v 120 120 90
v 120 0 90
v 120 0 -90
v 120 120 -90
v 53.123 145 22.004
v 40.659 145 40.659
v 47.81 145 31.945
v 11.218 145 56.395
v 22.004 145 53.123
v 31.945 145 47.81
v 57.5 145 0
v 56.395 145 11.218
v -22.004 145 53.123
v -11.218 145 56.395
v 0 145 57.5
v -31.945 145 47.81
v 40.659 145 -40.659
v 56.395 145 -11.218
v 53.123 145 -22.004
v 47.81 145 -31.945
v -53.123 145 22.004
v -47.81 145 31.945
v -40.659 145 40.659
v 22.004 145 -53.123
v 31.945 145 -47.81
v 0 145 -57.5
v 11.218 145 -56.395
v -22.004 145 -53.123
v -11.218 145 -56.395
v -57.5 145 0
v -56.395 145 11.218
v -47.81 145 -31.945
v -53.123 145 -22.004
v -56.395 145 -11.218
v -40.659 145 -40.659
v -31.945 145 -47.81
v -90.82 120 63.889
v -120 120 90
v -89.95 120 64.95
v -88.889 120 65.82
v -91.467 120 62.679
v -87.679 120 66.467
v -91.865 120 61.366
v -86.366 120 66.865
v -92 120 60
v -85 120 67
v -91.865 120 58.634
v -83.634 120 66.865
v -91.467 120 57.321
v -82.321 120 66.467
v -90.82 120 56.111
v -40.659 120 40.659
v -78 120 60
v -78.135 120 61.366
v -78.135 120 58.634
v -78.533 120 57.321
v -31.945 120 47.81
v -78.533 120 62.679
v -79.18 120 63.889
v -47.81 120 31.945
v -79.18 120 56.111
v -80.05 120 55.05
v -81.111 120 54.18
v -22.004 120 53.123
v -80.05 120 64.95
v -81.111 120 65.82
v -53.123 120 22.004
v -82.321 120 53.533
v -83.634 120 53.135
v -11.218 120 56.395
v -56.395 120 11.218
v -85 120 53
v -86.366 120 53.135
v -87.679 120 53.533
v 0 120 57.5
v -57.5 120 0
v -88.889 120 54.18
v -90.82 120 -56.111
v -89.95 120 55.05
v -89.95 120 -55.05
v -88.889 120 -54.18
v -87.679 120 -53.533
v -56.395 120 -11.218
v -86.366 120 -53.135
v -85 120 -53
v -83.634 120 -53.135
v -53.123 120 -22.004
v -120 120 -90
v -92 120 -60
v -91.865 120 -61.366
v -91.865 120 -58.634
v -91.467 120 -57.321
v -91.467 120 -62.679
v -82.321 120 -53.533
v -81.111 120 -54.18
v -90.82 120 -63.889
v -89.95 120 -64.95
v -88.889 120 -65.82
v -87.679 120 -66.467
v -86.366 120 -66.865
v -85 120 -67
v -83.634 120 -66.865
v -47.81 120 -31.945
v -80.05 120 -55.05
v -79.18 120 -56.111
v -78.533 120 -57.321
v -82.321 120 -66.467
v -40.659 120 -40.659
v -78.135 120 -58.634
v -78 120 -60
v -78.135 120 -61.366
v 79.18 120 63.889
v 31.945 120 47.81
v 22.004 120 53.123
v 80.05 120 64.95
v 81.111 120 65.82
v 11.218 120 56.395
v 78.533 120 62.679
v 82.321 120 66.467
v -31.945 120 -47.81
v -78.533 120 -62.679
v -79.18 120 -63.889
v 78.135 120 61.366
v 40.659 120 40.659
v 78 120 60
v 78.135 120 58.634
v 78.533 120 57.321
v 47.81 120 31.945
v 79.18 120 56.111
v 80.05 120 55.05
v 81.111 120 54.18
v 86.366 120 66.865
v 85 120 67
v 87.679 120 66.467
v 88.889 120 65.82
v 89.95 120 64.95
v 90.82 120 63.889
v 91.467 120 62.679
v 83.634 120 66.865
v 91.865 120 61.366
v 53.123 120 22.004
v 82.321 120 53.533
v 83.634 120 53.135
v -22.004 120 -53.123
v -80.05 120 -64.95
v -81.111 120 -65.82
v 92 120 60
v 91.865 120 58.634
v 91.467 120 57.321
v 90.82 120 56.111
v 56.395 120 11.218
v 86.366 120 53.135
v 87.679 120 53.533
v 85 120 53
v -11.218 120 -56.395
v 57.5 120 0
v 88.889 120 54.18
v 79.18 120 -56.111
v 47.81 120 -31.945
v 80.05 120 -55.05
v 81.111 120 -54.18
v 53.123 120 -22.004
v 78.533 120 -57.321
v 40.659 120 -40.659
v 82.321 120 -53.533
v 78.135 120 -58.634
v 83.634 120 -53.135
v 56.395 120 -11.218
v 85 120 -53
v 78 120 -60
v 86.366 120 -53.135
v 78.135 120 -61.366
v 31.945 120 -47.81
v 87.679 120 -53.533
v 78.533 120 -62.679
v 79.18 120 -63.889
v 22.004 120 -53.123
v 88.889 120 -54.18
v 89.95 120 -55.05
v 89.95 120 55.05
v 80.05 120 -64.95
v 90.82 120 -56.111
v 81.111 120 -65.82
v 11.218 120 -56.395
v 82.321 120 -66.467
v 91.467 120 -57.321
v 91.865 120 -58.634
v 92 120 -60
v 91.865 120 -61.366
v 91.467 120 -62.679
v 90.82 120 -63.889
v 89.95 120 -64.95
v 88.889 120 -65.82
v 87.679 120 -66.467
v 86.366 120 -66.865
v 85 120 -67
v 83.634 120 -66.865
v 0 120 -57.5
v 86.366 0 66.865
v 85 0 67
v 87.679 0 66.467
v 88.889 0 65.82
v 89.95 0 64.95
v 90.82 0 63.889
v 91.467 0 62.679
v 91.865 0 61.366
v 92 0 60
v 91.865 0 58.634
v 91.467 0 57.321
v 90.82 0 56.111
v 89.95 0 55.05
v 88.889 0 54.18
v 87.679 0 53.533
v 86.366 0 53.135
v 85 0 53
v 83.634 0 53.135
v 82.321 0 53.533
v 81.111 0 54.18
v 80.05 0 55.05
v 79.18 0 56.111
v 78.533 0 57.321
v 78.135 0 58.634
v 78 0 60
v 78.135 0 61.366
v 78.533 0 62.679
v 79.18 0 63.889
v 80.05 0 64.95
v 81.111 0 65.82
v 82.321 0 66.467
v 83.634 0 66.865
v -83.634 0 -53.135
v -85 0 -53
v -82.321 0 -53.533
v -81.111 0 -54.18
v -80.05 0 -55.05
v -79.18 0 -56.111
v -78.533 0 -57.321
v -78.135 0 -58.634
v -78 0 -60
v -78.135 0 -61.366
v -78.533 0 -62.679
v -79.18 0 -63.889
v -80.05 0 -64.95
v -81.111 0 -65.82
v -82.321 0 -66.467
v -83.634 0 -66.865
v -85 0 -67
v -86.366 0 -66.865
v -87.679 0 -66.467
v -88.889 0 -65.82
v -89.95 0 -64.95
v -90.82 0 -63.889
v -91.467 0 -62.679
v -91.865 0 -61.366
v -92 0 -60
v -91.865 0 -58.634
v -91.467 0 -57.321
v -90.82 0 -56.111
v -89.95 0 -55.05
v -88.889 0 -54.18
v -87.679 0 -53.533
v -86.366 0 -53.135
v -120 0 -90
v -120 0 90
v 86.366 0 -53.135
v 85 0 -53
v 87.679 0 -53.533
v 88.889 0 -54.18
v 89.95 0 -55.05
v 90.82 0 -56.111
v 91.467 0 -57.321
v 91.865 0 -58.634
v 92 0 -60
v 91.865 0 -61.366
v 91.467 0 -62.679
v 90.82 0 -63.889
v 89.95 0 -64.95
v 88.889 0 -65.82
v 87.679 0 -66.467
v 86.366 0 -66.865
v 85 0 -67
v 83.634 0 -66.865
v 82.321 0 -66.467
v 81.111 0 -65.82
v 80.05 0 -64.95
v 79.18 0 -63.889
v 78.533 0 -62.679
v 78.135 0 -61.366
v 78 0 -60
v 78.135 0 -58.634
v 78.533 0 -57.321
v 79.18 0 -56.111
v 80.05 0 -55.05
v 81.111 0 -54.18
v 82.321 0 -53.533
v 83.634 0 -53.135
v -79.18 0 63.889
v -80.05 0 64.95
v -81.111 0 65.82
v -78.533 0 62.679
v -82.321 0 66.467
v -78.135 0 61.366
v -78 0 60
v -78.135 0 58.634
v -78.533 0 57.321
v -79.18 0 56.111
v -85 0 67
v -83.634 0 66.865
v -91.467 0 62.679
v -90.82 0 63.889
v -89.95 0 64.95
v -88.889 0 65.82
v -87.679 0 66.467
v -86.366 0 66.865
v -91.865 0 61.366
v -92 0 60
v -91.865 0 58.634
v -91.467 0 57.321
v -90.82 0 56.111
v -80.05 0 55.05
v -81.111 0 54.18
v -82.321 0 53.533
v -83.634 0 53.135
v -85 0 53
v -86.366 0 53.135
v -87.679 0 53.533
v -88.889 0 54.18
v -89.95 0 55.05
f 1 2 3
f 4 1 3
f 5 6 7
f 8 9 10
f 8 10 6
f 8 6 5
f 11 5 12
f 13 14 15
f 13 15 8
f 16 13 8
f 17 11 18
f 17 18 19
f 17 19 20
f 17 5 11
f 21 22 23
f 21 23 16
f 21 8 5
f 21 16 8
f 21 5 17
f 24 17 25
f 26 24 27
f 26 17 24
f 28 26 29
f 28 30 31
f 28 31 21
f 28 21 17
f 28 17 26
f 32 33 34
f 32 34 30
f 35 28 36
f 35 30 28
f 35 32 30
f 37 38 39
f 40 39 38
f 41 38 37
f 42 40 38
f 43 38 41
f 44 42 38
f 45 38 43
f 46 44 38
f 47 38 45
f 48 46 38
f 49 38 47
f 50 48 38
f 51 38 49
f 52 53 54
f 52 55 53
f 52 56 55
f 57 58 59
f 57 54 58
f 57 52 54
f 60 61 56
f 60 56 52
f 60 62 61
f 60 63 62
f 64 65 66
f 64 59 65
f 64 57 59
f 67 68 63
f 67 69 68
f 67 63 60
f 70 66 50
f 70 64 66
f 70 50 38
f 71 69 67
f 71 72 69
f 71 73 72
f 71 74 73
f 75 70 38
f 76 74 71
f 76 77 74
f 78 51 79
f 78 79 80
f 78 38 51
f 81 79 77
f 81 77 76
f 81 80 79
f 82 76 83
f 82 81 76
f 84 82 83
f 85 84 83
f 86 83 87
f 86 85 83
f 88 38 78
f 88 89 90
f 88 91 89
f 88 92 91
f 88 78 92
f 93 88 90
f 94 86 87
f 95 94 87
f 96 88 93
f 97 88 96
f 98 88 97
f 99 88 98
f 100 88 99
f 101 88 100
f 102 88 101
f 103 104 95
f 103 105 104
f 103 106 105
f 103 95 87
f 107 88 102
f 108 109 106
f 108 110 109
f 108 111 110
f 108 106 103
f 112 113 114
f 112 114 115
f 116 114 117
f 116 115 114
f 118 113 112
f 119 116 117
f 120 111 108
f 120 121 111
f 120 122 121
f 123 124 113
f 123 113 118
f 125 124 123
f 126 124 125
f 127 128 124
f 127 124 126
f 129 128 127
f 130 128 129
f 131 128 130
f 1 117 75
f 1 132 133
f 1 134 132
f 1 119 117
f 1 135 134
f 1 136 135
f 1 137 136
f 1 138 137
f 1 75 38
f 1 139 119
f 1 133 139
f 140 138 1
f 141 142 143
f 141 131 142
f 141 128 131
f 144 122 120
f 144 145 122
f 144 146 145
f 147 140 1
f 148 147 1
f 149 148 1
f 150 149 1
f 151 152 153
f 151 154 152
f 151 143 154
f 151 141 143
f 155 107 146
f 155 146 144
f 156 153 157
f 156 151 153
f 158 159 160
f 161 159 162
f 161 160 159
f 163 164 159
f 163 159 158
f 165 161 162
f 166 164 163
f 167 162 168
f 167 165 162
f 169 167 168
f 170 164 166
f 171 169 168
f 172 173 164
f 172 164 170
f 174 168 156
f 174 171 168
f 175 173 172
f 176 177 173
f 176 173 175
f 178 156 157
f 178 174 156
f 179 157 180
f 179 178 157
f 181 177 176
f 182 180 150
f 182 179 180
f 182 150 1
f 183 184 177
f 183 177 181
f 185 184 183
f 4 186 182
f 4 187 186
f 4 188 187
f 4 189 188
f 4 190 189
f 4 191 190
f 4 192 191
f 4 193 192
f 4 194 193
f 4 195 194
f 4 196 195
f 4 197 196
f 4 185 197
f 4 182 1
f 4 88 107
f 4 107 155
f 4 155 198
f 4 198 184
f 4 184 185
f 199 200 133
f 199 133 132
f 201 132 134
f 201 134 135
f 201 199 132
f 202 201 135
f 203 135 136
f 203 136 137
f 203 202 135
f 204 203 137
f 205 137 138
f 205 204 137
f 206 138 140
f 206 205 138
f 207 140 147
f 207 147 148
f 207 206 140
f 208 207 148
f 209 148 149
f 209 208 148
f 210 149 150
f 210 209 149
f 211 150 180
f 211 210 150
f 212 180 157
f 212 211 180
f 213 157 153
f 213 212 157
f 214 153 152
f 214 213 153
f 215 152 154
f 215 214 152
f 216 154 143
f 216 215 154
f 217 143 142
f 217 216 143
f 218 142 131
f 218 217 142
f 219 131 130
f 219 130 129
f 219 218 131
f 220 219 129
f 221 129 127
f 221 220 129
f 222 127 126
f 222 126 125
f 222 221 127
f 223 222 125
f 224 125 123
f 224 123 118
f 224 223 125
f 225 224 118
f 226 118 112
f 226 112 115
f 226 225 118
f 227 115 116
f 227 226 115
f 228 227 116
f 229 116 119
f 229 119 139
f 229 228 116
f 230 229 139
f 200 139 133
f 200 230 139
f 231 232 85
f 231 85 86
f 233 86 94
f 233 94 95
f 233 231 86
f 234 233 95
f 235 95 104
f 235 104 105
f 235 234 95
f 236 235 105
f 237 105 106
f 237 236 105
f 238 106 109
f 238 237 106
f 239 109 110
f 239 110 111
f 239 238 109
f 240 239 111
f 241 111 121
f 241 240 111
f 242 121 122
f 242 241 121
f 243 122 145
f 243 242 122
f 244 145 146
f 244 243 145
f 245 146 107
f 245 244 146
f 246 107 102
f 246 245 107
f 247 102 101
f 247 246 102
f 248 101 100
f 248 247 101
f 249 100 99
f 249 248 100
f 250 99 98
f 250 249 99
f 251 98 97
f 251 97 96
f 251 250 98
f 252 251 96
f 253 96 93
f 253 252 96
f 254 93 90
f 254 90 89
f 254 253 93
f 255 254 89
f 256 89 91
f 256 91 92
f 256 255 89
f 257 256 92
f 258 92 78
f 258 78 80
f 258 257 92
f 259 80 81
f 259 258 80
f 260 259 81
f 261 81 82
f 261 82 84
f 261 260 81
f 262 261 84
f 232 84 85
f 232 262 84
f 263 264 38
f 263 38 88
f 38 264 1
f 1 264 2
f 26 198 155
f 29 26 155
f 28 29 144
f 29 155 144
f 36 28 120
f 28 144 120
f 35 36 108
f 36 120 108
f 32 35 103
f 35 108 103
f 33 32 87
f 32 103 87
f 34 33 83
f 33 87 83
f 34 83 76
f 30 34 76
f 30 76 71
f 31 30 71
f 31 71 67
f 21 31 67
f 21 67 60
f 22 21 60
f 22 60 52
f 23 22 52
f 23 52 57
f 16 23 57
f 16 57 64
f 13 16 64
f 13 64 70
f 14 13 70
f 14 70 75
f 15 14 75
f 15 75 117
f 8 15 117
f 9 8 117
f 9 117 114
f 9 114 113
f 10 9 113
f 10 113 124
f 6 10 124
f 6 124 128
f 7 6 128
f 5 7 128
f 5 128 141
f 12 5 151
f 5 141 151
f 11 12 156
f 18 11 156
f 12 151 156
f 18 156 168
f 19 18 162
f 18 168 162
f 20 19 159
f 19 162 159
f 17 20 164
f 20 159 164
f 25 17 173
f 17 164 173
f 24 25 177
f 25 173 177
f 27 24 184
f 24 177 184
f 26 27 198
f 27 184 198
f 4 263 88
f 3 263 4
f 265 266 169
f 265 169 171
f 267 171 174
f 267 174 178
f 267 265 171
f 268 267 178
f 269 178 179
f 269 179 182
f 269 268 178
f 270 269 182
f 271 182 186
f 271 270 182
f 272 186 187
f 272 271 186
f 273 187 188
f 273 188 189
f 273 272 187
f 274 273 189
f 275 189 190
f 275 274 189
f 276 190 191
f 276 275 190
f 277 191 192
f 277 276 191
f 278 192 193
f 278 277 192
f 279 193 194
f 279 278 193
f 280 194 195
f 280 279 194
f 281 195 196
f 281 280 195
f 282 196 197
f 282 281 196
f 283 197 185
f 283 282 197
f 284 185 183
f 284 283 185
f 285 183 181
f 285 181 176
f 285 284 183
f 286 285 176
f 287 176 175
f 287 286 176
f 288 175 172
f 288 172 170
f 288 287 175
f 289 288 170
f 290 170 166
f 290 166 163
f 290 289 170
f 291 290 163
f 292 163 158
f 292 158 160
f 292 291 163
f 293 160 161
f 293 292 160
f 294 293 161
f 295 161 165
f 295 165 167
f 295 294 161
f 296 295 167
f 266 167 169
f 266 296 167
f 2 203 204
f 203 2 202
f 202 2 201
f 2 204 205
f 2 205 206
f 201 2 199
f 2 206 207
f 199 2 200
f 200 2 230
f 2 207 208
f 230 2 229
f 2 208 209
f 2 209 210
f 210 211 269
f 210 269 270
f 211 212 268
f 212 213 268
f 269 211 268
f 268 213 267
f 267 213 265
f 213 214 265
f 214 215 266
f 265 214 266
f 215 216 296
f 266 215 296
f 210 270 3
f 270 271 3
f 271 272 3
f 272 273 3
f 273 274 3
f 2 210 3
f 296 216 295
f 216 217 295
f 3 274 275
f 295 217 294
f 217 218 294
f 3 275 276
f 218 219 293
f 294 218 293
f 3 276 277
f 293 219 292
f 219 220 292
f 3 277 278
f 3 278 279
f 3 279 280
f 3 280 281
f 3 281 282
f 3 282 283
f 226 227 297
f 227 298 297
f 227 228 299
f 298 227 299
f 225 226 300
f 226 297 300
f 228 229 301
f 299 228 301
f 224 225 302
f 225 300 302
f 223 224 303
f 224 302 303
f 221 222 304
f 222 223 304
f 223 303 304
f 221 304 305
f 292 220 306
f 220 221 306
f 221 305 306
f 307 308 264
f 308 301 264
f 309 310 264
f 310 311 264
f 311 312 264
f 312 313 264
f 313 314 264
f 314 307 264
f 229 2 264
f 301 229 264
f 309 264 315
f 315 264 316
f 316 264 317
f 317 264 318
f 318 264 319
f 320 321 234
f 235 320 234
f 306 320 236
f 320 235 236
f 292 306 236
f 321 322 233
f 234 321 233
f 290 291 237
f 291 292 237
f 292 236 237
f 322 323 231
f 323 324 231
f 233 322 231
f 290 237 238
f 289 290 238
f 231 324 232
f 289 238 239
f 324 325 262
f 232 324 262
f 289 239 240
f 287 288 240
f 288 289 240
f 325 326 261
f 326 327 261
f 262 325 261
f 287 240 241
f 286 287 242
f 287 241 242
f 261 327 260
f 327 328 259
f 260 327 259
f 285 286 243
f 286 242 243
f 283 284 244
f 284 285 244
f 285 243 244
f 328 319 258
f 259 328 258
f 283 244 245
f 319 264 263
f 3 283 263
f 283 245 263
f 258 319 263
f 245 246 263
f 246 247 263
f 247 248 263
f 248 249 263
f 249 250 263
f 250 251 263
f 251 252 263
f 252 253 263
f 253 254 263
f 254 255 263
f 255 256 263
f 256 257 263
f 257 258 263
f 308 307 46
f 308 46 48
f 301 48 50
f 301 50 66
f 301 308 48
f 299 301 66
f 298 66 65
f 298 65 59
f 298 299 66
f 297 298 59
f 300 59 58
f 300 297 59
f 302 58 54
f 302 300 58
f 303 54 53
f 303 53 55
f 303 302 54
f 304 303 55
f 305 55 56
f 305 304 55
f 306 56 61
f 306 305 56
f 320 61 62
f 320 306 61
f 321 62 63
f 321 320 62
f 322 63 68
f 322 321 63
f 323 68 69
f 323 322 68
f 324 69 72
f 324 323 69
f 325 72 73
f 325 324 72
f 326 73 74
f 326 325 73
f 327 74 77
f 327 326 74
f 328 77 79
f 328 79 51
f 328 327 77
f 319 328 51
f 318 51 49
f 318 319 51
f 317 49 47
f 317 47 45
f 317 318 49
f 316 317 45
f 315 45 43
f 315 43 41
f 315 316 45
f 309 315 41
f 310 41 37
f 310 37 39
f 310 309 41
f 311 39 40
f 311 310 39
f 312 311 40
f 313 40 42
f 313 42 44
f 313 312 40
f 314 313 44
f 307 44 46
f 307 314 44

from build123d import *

# Parameters (mm, degrees)
F_01_HOUSING_PROFILE_W        = 240
F_01_HOUSING_PROFILE_H        = 180
F_01_HOUSING_PROFILE_R        = 7
F_01_HOUSING_BLOCK_DEPTH      = 120
F_02_FACE_BOSS_PROFILE_R      = 57.5
F_02_FACE_LOCATING_BOSS_DEPTH = 145


with BuildPart() as part:
    # 01_Housing_Profile → 01_Housing_Block (new body)
    with BuildSketch(Plane(origin=(0, 0, 0), x_dir=(1, 0, 0), z_dir=(0, 1, 0))):
        Rectangle(F_01_HOUSING_PROFILE_W, F_01_HOUSING_PROFILE_H)
        with Locations(Location((-85, -60, 0), (0, 0, 270))):
            Circle(F_01_HOUSING_PROFILE_R, mode=Mode.SUBTRACT)
        with Locations(Location((85, -60, 0), (0, 0, 270))):
            Circle(F_01_HOUSING_PROFILE_R, mode=Mode.SUBTRACT)
        with Locations(Location((-85, 60, 0), (0, 0, 270))):
            Circle(F_01_HOUSING_PROFILE_R, mode=Mode.SUBTRACT)
        with Locations(Location((85, 60, 0), (0, 0, 270))):
            Circle(F_01_HOUSING_PROFILE_R, mode=Mode.SUBTRACT)
    extrude(amount=F_01_HOUSING_BLOCK_DEPTH)

    # 02_Face_Boss_Profile → 02_Face_Locating_Boss (add)
    with BuildSketch(Plane(origin=(0, 0, 0), x_dir=(1, 0, 0), z_dir=(0, 1, 0))):
        with Locations(Location((0, 0, 0), (0, 0, 90))):
            Circle(F_02_FACE_BOSS_PROFILE_R)
    extrude(amount=F_02_FACE_LOCATING_BOSS_DEPTH)


solid = part.part
